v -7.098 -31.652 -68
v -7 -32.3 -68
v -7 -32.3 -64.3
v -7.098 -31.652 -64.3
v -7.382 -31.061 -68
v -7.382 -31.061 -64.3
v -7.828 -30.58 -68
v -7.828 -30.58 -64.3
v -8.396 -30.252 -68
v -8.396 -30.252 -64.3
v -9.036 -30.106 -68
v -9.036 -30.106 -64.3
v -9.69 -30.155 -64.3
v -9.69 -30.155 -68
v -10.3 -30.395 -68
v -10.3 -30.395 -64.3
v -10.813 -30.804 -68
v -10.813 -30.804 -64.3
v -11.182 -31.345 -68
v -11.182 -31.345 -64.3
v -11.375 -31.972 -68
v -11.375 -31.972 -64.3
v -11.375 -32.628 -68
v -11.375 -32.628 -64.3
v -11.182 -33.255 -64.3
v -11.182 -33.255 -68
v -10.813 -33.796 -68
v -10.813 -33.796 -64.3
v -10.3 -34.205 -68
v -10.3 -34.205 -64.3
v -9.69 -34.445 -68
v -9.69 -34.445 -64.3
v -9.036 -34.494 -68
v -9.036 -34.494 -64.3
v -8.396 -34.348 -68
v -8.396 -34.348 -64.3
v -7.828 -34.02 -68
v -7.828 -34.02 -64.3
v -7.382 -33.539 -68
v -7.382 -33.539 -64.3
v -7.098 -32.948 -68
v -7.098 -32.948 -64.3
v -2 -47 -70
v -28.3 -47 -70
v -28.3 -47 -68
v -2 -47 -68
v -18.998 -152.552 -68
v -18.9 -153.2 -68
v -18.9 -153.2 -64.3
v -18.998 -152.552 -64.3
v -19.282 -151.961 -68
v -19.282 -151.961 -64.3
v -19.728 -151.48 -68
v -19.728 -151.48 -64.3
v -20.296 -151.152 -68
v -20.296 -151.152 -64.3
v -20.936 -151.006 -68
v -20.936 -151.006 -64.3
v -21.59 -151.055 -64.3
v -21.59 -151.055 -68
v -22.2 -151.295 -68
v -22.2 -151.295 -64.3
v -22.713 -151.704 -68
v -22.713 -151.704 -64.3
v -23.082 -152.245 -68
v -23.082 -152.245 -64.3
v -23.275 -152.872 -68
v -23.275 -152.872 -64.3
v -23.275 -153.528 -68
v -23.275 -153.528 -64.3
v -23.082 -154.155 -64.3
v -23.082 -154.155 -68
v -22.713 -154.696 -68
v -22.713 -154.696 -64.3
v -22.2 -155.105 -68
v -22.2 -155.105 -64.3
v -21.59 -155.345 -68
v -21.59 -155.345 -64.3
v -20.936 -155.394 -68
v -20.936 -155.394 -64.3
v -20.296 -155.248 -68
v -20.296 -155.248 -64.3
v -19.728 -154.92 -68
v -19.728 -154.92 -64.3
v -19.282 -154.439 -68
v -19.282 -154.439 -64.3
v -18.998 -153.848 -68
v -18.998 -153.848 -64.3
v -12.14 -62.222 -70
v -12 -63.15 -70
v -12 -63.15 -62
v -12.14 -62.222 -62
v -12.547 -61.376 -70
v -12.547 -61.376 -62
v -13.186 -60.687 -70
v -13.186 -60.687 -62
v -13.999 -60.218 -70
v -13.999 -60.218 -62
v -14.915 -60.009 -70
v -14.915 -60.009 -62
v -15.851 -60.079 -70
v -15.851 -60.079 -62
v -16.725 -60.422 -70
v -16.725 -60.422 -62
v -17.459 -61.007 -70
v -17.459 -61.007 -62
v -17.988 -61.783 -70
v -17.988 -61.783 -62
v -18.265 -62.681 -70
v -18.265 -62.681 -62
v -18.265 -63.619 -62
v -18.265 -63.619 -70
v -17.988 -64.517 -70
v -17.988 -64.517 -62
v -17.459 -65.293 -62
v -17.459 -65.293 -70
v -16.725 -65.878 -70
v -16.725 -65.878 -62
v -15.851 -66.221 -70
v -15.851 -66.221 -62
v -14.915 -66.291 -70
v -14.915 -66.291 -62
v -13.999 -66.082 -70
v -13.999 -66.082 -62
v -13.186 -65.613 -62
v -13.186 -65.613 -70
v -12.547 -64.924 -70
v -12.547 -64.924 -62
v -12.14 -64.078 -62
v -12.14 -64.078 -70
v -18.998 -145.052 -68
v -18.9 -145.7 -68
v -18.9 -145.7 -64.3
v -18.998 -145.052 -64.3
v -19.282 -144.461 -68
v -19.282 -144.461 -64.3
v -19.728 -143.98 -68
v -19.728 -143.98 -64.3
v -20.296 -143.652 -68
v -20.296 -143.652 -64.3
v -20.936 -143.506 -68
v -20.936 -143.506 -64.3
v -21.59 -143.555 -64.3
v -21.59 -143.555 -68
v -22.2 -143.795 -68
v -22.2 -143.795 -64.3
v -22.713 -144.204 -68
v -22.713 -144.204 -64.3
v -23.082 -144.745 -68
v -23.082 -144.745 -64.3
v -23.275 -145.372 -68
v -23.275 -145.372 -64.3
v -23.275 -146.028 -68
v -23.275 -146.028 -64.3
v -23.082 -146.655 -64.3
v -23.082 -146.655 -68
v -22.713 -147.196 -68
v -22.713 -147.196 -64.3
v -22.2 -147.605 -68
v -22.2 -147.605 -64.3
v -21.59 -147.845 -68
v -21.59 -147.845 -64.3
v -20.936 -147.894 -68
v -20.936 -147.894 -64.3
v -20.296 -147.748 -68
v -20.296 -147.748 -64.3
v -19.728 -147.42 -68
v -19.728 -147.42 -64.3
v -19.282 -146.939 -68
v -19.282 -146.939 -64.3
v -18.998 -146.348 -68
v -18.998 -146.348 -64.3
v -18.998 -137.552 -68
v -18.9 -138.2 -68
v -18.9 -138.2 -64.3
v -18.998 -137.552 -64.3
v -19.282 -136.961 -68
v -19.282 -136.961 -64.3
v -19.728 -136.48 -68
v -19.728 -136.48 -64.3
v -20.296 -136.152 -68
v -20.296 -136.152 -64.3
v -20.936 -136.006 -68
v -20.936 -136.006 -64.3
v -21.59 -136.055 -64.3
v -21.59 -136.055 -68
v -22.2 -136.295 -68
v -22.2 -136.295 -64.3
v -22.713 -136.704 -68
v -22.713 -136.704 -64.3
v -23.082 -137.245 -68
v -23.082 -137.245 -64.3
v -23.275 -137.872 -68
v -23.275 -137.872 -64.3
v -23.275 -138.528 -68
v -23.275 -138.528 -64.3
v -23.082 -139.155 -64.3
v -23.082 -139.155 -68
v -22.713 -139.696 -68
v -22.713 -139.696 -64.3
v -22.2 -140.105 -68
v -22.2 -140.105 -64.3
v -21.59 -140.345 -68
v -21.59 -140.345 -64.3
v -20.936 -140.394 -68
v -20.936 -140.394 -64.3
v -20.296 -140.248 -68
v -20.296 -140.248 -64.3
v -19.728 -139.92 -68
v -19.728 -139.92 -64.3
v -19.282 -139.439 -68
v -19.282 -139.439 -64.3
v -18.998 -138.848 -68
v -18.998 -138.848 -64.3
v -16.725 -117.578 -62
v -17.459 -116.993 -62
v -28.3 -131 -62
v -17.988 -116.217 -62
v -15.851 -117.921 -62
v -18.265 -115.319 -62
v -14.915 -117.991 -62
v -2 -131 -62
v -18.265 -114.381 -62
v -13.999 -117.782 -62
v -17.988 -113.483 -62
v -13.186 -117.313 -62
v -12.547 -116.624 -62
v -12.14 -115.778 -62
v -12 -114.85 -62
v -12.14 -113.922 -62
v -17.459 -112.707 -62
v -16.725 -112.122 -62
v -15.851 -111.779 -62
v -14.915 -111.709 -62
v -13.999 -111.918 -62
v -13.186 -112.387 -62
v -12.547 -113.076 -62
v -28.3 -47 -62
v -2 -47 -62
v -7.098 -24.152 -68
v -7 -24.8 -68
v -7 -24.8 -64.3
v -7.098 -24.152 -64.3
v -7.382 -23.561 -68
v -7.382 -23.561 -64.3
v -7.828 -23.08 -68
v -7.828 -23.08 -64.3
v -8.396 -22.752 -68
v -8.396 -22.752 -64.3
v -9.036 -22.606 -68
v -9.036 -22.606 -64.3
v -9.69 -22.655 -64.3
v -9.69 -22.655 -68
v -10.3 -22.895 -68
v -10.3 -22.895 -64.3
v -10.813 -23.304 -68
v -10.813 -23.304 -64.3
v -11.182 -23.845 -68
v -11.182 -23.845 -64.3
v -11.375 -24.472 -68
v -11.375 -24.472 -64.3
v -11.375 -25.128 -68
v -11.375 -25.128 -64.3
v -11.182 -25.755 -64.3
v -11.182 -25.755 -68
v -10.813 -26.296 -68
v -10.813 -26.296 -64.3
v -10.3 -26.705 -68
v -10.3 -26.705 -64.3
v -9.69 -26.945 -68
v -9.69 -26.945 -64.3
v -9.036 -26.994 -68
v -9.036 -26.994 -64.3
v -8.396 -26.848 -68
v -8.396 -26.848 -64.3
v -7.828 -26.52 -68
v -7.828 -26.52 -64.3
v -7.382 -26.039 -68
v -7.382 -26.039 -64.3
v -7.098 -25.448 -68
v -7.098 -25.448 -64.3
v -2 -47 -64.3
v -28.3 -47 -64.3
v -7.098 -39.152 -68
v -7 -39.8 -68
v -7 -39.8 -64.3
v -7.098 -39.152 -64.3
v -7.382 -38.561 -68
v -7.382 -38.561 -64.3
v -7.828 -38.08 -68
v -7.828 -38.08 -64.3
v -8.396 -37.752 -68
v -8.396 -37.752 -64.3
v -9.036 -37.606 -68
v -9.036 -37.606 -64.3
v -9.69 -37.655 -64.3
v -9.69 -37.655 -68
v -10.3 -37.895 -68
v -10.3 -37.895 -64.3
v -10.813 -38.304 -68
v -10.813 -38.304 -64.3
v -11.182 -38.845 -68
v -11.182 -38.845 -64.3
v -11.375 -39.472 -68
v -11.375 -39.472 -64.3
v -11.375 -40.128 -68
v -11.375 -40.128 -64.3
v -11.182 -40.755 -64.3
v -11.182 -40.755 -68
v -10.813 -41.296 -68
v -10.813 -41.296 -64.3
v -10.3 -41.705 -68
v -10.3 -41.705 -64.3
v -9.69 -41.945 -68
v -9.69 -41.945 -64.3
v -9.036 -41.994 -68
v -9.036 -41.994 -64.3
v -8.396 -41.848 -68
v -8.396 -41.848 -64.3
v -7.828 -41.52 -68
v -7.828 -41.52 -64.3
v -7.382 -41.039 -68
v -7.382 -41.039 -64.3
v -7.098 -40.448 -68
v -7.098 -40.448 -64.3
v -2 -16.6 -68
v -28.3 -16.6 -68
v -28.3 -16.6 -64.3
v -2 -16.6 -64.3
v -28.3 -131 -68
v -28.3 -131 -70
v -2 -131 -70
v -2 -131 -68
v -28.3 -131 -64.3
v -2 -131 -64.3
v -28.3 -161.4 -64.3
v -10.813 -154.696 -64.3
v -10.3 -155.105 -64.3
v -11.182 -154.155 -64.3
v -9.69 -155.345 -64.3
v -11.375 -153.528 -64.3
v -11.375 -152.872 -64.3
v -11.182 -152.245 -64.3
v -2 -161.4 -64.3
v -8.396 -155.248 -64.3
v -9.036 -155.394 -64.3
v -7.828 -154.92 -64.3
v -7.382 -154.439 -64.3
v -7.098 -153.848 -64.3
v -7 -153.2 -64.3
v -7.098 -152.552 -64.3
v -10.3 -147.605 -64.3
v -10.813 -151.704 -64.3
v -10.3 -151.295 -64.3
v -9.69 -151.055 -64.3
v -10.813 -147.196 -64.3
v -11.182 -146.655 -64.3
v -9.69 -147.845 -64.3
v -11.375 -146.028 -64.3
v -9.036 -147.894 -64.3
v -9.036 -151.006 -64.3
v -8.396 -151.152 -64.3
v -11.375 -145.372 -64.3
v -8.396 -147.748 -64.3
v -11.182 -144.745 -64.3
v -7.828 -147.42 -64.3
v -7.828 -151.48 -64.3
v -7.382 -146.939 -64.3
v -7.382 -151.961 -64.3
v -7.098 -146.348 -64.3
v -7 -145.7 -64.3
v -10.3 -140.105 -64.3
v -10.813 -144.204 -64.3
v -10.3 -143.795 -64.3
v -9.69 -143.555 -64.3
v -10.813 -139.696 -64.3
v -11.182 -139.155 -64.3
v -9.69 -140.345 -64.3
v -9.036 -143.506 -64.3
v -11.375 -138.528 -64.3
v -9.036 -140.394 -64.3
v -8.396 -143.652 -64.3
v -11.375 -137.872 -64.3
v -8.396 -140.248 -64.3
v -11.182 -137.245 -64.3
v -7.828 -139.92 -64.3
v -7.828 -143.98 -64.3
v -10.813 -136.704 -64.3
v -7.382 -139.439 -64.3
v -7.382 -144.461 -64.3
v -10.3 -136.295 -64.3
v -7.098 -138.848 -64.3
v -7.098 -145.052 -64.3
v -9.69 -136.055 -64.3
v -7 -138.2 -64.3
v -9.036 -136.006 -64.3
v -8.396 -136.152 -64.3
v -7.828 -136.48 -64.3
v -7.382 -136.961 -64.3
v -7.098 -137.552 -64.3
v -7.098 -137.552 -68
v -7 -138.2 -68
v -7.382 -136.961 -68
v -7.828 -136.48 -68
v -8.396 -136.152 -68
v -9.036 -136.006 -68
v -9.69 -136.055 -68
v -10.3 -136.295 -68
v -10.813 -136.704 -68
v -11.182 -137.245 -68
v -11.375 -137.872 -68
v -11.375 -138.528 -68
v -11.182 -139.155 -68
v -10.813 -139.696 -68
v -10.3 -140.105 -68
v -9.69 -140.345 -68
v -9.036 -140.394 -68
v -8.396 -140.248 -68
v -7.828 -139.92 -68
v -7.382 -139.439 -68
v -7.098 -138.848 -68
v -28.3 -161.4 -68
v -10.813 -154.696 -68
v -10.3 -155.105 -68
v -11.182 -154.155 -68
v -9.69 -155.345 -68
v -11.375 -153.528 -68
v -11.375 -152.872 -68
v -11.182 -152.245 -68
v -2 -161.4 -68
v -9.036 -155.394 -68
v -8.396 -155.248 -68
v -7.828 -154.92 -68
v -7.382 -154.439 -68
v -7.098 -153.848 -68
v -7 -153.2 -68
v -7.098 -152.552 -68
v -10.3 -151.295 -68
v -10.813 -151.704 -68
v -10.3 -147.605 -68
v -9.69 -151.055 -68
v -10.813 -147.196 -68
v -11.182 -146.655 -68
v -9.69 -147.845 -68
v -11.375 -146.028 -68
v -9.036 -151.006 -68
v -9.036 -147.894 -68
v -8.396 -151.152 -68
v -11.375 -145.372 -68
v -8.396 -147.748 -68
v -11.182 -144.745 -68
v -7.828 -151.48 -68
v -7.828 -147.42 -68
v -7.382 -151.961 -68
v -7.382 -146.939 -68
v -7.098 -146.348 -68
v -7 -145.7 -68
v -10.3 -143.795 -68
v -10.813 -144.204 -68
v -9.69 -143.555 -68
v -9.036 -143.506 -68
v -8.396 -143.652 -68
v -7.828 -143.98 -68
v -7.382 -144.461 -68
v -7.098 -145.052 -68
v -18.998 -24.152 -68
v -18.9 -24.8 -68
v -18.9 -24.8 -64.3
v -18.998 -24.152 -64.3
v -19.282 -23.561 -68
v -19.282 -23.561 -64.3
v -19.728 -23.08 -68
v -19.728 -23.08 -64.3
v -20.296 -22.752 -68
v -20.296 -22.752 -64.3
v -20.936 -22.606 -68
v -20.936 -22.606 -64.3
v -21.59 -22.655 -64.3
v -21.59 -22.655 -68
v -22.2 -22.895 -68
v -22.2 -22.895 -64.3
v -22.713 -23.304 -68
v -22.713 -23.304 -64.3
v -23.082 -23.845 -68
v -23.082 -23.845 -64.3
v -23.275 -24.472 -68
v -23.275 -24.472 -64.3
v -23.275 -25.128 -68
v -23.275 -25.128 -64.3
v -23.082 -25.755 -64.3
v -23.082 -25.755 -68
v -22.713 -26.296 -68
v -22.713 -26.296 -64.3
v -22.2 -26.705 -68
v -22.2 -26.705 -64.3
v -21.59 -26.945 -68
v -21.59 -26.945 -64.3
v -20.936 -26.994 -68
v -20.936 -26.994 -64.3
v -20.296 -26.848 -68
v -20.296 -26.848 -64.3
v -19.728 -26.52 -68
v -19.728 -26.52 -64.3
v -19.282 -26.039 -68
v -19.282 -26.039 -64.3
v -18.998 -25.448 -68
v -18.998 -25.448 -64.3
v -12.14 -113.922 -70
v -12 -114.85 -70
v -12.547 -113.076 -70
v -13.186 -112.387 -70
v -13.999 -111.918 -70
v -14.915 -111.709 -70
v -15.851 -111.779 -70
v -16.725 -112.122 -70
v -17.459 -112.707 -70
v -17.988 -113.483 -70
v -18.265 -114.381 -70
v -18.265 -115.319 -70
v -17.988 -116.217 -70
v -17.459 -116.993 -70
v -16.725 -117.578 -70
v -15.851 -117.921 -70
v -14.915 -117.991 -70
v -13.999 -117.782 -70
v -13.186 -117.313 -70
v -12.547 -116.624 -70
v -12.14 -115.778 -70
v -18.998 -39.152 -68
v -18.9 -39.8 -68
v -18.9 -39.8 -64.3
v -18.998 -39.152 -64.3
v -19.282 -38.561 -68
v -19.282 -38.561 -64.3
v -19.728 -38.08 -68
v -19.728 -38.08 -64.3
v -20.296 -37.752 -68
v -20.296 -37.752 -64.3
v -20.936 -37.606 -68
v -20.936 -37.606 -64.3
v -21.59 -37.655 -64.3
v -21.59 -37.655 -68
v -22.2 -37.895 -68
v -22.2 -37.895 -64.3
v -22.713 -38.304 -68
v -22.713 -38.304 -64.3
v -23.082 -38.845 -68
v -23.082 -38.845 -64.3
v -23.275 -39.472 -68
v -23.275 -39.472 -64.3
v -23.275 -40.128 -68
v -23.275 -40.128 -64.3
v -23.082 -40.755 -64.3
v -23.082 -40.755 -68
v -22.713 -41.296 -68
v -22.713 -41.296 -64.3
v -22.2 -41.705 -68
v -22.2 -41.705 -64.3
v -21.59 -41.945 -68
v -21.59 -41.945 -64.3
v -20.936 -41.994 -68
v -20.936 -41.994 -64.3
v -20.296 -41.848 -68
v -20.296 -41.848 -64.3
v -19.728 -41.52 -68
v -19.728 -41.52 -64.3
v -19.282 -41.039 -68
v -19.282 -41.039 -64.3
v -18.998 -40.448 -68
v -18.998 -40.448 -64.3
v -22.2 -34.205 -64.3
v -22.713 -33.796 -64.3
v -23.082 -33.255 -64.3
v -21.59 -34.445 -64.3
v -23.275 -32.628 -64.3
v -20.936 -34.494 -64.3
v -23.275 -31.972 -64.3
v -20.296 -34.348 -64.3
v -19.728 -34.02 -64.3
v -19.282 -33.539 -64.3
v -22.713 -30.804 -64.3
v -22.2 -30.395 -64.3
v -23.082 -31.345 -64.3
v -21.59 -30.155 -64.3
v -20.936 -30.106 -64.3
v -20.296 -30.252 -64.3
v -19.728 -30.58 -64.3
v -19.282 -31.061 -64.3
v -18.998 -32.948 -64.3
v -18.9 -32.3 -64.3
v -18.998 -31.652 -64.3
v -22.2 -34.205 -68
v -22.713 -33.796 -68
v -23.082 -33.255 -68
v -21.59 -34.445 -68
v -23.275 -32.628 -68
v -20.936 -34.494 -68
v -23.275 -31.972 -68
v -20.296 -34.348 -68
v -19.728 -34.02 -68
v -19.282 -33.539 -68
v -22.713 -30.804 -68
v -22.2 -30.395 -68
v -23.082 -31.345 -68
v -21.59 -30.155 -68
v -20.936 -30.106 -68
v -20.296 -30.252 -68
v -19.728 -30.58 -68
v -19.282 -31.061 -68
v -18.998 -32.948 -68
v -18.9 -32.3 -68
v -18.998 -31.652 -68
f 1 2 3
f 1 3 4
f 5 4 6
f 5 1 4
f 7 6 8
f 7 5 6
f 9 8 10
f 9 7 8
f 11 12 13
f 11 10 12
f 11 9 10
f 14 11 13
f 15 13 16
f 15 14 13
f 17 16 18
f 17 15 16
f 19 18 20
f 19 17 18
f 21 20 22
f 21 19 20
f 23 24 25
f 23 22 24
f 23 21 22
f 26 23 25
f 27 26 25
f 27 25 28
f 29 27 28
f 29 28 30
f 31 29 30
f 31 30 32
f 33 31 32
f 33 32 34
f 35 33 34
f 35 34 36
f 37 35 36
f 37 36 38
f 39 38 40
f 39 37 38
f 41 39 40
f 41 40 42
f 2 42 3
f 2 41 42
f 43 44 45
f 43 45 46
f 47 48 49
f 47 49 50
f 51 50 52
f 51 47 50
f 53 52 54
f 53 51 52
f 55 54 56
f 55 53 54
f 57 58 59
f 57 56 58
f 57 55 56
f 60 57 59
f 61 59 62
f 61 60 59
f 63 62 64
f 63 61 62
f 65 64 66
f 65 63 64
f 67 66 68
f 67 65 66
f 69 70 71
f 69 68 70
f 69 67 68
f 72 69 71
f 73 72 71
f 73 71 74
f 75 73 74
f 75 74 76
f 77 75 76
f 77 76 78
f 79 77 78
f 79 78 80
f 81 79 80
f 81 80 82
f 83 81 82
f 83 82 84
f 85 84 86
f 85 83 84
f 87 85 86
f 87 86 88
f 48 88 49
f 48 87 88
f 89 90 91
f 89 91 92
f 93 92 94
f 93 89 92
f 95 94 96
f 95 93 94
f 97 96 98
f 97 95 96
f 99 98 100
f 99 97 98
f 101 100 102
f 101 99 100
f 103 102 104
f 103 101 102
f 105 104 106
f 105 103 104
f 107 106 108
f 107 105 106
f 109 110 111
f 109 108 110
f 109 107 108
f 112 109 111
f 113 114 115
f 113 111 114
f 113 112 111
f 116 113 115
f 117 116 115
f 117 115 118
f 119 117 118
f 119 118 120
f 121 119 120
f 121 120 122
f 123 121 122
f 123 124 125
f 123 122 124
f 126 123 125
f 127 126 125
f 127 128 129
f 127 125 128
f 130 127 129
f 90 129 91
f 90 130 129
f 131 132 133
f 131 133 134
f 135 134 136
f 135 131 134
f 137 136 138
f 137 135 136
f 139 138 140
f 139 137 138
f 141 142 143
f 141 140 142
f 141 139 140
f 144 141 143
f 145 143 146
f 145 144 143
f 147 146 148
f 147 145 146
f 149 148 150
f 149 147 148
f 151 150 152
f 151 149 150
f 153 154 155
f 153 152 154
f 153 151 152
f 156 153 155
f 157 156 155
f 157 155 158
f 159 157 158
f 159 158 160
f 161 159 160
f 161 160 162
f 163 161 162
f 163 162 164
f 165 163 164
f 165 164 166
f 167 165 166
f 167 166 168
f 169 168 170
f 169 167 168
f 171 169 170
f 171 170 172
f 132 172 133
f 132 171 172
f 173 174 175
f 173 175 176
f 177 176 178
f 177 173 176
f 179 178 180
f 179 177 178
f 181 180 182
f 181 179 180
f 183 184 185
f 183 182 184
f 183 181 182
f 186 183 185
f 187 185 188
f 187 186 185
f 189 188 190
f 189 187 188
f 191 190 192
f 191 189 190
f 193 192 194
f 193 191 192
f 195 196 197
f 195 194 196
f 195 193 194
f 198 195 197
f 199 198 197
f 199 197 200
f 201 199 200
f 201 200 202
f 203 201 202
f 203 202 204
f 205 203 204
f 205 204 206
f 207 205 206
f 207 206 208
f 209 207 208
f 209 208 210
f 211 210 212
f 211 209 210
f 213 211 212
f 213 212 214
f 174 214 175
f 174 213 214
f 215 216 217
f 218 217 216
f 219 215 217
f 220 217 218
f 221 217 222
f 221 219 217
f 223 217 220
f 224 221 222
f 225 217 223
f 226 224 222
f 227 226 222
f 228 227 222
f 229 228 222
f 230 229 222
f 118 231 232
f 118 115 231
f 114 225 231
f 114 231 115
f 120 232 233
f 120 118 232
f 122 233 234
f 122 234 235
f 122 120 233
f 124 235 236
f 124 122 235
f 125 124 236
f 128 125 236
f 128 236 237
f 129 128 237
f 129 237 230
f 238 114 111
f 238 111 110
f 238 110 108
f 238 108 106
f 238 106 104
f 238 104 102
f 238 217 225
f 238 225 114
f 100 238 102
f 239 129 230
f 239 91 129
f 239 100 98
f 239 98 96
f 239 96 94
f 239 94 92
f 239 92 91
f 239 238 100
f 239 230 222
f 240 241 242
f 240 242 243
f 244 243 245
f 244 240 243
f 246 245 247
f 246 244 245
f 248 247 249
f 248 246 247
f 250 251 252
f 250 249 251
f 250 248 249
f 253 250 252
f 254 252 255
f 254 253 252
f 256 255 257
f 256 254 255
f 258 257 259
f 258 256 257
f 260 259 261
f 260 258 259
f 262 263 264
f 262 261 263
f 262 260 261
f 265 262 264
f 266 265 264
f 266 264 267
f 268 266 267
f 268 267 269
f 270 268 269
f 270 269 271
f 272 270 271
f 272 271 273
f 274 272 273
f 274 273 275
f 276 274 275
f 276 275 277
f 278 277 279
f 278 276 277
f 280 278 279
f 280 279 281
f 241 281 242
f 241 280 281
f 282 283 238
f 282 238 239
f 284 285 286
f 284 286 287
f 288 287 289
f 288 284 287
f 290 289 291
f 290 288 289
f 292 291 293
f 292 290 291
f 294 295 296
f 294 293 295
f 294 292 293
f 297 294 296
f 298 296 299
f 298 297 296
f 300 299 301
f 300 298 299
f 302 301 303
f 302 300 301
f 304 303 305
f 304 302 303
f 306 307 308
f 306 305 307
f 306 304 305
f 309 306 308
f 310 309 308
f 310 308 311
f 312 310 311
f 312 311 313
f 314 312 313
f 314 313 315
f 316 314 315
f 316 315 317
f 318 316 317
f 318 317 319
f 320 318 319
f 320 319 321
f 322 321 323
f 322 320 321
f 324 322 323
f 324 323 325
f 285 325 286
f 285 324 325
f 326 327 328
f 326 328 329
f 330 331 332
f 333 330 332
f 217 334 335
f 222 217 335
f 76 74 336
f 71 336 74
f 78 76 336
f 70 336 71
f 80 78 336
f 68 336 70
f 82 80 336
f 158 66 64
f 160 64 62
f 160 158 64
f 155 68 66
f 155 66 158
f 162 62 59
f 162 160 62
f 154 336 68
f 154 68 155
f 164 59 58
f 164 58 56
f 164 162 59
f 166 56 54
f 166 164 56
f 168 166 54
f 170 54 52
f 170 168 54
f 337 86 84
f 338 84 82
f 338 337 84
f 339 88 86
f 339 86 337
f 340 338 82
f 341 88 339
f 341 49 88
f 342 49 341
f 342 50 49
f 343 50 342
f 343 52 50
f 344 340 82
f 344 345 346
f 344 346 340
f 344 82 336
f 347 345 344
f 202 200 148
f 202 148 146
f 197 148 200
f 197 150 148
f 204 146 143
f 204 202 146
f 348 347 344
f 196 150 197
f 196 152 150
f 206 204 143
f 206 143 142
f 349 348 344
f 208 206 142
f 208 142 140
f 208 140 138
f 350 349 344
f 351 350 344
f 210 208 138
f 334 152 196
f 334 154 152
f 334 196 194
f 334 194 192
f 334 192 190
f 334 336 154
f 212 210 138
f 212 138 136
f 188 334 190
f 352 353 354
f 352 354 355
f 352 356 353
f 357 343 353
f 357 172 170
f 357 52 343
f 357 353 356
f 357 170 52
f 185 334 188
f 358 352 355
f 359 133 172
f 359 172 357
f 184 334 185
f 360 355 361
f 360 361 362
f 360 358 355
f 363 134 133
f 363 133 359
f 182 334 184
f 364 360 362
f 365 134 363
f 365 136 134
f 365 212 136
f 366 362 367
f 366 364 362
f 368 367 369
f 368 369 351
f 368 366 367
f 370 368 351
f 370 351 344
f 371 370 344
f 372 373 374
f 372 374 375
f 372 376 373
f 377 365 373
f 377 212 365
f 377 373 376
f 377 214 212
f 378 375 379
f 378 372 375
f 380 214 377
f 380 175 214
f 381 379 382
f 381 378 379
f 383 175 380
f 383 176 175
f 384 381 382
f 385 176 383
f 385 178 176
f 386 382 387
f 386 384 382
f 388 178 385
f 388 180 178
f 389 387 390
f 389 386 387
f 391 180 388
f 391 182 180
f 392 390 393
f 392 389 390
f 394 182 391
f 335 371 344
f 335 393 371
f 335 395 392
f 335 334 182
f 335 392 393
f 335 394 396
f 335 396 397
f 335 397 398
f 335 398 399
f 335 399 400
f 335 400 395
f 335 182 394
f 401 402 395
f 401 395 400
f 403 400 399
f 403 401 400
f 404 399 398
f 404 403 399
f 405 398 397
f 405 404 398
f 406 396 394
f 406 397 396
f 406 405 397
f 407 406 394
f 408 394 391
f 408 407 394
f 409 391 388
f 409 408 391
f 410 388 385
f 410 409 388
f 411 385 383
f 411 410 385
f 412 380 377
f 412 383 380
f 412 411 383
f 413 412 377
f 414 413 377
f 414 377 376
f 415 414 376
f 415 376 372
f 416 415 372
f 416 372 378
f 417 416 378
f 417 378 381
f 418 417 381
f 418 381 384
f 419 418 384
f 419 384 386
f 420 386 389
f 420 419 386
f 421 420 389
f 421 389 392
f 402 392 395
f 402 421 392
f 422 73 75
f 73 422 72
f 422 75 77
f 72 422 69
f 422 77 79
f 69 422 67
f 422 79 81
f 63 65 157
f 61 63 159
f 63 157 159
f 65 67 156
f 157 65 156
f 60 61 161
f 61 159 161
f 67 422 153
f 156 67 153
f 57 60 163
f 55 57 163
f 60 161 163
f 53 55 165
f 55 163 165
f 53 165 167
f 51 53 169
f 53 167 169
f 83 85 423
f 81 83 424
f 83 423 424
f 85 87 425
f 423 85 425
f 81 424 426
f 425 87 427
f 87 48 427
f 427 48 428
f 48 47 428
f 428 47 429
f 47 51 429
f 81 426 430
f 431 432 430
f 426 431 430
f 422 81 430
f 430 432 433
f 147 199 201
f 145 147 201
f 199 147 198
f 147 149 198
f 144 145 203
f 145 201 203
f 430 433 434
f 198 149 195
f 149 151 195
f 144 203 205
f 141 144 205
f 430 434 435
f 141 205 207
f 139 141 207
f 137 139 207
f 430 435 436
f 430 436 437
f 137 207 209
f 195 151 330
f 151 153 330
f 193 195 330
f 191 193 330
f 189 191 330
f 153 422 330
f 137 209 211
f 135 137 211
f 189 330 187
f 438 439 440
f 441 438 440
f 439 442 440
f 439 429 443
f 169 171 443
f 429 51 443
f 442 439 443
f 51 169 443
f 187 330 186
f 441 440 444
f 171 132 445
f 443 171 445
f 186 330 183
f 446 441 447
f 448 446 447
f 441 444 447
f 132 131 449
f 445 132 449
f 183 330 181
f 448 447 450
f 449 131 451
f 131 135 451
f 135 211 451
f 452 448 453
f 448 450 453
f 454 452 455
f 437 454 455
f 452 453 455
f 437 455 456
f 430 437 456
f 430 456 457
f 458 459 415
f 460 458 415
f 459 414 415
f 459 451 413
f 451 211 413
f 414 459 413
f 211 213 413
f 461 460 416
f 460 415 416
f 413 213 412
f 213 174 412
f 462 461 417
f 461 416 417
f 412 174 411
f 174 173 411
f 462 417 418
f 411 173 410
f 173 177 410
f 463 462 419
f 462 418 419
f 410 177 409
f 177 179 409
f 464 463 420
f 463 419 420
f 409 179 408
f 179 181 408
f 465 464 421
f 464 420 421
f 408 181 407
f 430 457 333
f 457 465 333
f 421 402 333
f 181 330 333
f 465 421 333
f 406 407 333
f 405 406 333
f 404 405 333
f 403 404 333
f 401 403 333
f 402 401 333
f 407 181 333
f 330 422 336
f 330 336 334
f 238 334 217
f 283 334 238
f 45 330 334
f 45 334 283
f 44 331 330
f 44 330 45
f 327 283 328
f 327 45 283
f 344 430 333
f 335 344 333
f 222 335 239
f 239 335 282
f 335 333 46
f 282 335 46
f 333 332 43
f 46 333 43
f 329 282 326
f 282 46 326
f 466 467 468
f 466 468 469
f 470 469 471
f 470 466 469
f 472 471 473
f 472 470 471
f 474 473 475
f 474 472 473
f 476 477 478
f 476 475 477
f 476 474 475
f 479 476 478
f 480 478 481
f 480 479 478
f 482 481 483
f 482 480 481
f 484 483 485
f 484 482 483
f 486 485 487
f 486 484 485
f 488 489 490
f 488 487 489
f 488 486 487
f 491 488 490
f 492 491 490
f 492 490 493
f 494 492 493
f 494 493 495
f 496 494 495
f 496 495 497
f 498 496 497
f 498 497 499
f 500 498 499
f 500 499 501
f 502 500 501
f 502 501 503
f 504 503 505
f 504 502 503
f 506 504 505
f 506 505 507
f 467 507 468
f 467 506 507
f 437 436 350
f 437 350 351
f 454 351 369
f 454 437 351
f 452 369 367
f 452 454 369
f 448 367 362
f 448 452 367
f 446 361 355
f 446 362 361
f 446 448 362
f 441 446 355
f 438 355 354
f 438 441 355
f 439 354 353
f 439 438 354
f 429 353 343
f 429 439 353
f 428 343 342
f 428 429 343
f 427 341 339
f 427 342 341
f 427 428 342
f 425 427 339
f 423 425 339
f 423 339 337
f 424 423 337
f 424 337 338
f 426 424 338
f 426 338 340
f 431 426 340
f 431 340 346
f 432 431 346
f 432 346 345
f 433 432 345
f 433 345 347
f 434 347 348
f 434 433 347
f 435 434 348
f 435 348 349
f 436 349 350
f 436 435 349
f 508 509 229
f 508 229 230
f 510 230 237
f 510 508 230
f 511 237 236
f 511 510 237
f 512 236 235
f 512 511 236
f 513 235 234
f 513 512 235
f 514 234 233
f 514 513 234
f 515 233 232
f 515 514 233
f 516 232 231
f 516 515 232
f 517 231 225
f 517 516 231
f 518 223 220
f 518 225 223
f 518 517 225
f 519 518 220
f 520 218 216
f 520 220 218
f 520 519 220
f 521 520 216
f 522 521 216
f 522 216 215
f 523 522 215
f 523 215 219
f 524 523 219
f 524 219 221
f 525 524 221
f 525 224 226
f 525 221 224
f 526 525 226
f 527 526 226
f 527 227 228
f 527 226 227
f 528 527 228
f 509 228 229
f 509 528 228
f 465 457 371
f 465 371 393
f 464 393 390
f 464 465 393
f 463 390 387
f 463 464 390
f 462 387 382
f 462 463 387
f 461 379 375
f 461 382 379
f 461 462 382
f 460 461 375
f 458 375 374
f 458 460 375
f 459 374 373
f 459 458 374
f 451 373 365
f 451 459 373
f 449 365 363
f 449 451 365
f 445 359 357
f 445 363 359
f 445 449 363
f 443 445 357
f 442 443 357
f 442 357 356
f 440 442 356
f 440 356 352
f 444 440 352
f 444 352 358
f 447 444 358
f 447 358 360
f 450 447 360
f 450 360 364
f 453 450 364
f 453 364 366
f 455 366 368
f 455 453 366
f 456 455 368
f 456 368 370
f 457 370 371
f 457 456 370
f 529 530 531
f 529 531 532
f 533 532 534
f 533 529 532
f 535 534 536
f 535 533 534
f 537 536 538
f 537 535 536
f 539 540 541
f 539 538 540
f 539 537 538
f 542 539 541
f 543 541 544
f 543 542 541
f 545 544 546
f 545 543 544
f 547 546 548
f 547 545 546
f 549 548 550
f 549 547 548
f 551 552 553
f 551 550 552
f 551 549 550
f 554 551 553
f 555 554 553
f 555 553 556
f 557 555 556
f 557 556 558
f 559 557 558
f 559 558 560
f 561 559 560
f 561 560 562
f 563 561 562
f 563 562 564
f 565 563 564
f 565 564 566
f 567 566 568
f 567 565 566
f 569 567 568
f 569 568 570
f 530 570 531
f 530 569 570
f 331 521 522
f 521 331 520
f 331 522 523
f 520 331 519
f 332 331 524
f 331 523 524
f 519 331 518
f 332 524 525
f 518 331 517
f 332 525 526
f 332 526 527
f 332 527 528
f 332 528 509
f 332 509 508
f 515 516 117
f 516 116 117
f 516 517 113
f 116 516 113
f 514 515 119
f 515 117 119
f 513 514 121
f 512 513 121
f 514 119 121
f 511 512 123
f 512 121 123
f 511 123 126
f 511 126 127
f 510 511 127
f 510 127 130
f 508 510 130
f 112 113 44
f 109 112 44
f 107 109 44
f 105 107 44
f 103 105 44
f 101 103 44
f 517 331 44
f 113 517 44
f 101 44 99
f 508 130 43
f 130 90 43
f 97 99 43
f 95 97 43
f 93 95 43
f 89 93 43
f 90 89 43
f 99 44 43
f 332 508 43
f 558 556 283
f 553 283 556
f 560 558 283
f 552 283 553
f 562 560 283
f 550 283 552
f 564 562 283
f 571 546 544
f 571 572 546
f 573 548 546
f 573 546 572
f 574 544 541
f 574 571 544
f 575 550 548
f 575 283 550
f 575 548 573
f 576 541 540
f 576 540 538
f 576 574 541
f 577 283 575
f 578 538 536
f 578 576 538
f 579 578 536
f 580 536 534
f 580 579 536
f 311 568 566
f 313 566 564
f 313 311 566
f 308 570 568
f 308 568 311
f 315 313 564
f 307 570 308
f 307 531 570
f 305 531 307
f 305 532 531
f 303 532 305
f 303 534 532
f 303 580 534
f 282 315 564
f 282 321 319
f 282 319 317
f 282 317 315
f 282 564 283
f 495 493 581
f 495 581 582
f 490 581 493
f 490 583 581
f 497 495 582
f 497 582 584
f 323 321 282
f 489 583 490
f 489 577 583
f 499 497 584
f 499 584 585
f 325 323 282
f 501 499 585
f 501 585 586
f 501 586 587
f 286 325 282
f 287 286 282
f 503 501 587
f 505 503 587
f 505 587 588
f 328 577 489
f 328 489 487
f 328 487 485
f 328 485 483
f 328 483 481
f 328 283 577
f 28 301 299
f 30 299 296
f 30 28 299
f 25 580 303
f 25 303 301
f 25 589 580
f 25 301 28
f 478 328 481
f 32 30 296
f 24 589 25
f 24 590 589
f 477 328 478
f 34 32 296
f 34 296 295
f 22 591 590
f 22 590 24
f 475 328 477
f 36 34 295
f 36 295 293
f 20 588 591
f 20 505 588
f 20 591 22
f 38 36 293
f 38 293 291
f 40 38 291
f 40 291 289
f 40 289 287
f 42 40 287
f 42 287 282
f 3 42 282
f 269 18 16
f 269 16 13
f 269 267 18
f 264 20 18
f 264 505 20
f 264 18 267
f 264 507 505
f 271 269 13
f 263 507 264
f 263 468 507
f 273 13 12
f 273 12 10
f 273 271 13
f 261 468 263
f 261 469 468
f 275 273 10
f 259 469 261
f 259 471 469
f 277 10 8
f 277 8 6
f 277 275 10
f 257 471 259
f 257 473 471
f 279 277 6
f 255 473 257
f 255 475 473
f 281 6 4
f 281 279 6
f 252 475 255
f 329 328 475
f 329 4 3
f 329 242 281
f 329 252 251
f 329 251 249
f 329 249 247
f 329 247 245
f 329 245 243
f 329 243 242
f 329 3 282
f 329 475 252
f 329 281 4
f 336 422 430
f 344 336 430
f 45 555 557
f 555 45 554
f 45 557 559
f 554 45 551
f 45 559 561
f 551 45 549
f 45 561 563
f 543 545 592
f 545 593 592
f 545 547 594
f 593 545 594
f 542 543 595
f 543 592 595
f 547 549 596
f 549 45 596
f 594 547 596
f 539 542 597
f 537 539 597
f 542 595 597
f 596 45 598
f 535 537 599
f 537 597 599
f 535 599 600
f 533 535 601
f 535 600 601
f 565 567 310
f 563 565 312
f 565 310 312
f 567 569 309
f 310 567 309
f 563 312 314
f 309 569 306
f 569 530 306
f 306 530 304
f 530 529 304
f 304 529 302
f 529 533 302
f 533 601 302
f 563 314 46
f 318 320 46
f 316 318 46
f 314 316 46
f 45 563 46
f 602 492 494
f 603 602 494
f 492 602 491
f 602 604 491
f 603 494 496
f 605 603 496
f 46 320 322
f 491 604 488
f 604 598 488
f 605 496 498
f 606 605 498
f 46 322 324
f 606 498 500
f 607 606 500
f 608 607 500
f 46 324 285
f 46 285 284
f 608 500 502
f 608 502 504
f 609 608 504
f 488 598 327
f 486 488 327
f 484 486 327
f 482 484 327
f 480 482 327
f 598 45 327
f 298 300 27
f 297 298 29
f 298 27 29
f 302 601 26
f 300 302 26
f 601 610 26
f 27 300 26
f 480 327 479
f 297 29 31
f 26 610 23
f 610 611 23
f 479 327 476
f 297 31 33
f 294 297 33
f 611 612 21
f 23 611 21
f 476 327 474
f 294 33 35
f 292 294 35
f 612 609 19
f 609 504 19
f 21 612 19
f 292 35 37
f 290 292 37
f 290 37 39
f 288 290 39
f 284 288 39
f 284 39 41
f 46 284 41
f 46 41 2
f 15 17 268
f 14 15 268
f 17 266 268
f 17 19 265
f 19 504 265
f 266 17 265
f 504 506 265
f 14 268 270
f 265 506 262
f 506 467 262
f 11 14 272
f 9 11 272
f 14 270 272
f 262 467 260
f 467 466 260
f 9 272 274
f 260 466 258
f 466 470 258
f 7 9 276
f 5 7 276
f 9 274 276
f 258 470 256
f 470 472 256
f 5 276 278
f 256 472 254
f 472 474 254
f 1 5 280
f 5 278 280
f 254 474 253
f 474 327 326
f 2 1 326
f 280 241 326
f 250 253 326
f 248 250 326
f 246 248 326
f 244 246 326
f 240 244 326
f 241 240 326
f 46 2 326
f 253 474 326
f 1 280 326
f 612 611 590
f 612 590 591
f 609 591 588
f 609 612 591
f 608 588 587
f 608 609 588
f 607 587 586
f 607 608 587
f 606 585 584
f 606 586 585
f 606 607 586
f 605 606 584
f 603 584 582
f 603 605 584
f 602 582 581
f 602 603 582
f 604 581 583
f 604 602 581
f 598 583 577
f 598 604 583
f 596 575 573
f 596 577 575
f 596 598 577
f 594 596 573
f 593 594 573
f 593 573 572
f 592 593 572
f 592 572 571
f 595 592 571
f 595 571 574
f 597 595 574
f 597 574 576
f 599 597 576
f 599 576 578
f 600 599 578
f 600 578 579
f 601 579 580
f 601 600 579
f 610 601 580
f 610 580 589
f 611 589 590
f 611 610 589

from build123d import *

# Parameters (mm, degrees)
CYLINDER042_R     = 3.15
CYLINDER042_DEPTH = 10
ARRAY016_Y_COUNT  = 2
ARRAY016_Y_PITCH  = 51.7
CYLINDER036_R     = 2.2
CYLINDER036_DEPTH = 26
ARRAY010_X_COUNT  = 2
ARRAY010_X_PITCH  = 11.9
ARRAY010_Y_COUNT  = 3
ARRAY010_Y_PITCH  = 7.5
CYLINDER035_R     = 2.2
CYLINDER035_DEPTH = 26
ARRAY009_X_COUNT  = 2
ARRAY009_X_PITCH  = 11.9
ARRAY009_Y_COUNT  = 3
ARRAY009_Y_PITCH  = 7.5
BOX041_W          = 26.3
BOX041_H          = 84
BOX041_DEPTH      = 8
BOX040_W          = 26.3
BOX040_H          = 144.8
BOX040_DEPTH      = 3.7


with BuildPart() as taladros_union_cp:
    # Cylinder042 → Cylinder042 (new body)
    with BuildSketch(Plane(origin=(-15.15, -63.15, -71), x_dir=(1, 0, 0), z_dir=(0, 0, 1))):
        Circle(CYLINDER042_R)
    extrude(amount=CYLINDER042_DEPTH)

    # Array016 Y: taladros_union_CP ×2


with BuildPart() as taladros_union_cp_1:
    add(taladros_union_cp.part)
    with Locations(*[(0, -i * ARRAY016_Y_PITCH, 0) for i in range(1, ARRAY016_Y_COUNT)]):
        add(taladros_union_cp.part)


with BuildPart() as taladros_cadera_centro1:
    # Cylinder036 → Cylinder036 (new body)
    with BuildSketch(Plane(origin=(-9.2, -39.8, -80), x_dir=(1, 0, 0), z_dir=(0, 0, 1))):
        Circle(CYLINDER036_R)
    extrude(amount=CYLINDER036_DEPTH)

    # Array010 X: Taladros_cadera_centro1 ×2


with BuildPart() as taladros_cadera_centro1_1:
    add(taladros_cadera_centro1.part)
    with Locations(*[(-i * ARRAY010_X_PITCH, 0, 0) for i in range(1, ARRAY010_X_COUNT)]):
        add(taladros_cadera_centro1.part)

    # Array010 Y: Taladros_cadera_centro1 ×3


with BuildPart() as taladros_cadera_centro1_2:
    add(taladros_cadera_centro1_1.part)
    with Locations(*[(0, i * ARRAY010_Y_PITCH, 0) for i in range(1, ARRAY010_Y_COUNT)]):
        add(taladros_cadera_centro1_1.part)


with BuildPart() as taladros_cadera_centro1_3:
    # Array010 placement: moved
    add(taladros_cadera_centro1_2.part.moved(Location((0, -113.4, 0))))


with BuildPart() as taladros_cadera_centro:
    # Cylinder035 → Cylinder035 (new body)
    with BuildSketch(Plane(origin=(-9.2, -39.8, -80), x_dir=(1, 0, 0), z_dir=(0, 0, 1))):
        Circle(CYLINDER035_R)
    extrude(amount=CYLINDER035_DEPTH)

    # Array009 X: Taladros_cadera_centro ×2


with BuildPart() as taladros_cadera_centro_1:
    add(taladros_cadera_centro.part)
    with Locations(*[(-i * ARRAY009_X_PITCH, 0, 0) for i in range(1, ARRAY009_X_COUNT)]):
        add(taladros_cadera_centro.part)

    # Array009 Y: Taladros_cadera_centro ×3


with BuildPart() as taladros_cadera_centro_2:
    add(taladros_cadera_centro_1.part)
    with Locations(*[(0, i * ARRAY009_Y_PITCH, 0) for i in range(1, ARRAY009_Y_COUNT)]):
        add(taladros_cadera_centro_1.part)


with BuildPart() as cadera_base_centro001:
    # Box041 → Box041 (new body)
    with BuildSketch(Plane(origin=(-28.3, -133, -70), x_dir=(1, 0, 0), z_dir=(0, 0, 1))):
        with Locations((13.15, 42)):
            Rectangle(BOX041_W, BOX041_H)
    extrude(amount=BOX041_DEPTH)


with BuildPart() as cadera_centro_full:
    # Box040 → Box040 (new body)
    with BuildSketch(Plane(origin=(-28.3, -163.4, -68), x_dir=(1, 0, 0), z_dir=(0, 0, 1))):
        with Locations((13.15, 72.4)):
            Rectangle(BOX040_W, BOX040_H)
    extrude(amount=BOX040_DEPTH)

    # Fusion009003047: union Cadera_base_centro001
    add(cadera_base_centro001.part)


with BuildPart() as cadera_centro_full_1:
    # Fusion009003047 placement: moved
    add(cadera_centro_full.part.moved(Location((0, 2, 0))))

    # Cut035: cut Taladros_cadera_centro
    add(taladros_cadera_centro_2.part, mode=Mode.SUBTRACT)

    # Cut036: cut Taladros_cadera_centro1
    add(taladros_cadera_centro1_3.part, mode=Mode.SUBTRACT)

    # Cut049: cut taladros_union_CP
    add(taladros_union_cp_1.part, mode=Mode.SUBTRACT)


solid = cadera_centro_full_1.part
